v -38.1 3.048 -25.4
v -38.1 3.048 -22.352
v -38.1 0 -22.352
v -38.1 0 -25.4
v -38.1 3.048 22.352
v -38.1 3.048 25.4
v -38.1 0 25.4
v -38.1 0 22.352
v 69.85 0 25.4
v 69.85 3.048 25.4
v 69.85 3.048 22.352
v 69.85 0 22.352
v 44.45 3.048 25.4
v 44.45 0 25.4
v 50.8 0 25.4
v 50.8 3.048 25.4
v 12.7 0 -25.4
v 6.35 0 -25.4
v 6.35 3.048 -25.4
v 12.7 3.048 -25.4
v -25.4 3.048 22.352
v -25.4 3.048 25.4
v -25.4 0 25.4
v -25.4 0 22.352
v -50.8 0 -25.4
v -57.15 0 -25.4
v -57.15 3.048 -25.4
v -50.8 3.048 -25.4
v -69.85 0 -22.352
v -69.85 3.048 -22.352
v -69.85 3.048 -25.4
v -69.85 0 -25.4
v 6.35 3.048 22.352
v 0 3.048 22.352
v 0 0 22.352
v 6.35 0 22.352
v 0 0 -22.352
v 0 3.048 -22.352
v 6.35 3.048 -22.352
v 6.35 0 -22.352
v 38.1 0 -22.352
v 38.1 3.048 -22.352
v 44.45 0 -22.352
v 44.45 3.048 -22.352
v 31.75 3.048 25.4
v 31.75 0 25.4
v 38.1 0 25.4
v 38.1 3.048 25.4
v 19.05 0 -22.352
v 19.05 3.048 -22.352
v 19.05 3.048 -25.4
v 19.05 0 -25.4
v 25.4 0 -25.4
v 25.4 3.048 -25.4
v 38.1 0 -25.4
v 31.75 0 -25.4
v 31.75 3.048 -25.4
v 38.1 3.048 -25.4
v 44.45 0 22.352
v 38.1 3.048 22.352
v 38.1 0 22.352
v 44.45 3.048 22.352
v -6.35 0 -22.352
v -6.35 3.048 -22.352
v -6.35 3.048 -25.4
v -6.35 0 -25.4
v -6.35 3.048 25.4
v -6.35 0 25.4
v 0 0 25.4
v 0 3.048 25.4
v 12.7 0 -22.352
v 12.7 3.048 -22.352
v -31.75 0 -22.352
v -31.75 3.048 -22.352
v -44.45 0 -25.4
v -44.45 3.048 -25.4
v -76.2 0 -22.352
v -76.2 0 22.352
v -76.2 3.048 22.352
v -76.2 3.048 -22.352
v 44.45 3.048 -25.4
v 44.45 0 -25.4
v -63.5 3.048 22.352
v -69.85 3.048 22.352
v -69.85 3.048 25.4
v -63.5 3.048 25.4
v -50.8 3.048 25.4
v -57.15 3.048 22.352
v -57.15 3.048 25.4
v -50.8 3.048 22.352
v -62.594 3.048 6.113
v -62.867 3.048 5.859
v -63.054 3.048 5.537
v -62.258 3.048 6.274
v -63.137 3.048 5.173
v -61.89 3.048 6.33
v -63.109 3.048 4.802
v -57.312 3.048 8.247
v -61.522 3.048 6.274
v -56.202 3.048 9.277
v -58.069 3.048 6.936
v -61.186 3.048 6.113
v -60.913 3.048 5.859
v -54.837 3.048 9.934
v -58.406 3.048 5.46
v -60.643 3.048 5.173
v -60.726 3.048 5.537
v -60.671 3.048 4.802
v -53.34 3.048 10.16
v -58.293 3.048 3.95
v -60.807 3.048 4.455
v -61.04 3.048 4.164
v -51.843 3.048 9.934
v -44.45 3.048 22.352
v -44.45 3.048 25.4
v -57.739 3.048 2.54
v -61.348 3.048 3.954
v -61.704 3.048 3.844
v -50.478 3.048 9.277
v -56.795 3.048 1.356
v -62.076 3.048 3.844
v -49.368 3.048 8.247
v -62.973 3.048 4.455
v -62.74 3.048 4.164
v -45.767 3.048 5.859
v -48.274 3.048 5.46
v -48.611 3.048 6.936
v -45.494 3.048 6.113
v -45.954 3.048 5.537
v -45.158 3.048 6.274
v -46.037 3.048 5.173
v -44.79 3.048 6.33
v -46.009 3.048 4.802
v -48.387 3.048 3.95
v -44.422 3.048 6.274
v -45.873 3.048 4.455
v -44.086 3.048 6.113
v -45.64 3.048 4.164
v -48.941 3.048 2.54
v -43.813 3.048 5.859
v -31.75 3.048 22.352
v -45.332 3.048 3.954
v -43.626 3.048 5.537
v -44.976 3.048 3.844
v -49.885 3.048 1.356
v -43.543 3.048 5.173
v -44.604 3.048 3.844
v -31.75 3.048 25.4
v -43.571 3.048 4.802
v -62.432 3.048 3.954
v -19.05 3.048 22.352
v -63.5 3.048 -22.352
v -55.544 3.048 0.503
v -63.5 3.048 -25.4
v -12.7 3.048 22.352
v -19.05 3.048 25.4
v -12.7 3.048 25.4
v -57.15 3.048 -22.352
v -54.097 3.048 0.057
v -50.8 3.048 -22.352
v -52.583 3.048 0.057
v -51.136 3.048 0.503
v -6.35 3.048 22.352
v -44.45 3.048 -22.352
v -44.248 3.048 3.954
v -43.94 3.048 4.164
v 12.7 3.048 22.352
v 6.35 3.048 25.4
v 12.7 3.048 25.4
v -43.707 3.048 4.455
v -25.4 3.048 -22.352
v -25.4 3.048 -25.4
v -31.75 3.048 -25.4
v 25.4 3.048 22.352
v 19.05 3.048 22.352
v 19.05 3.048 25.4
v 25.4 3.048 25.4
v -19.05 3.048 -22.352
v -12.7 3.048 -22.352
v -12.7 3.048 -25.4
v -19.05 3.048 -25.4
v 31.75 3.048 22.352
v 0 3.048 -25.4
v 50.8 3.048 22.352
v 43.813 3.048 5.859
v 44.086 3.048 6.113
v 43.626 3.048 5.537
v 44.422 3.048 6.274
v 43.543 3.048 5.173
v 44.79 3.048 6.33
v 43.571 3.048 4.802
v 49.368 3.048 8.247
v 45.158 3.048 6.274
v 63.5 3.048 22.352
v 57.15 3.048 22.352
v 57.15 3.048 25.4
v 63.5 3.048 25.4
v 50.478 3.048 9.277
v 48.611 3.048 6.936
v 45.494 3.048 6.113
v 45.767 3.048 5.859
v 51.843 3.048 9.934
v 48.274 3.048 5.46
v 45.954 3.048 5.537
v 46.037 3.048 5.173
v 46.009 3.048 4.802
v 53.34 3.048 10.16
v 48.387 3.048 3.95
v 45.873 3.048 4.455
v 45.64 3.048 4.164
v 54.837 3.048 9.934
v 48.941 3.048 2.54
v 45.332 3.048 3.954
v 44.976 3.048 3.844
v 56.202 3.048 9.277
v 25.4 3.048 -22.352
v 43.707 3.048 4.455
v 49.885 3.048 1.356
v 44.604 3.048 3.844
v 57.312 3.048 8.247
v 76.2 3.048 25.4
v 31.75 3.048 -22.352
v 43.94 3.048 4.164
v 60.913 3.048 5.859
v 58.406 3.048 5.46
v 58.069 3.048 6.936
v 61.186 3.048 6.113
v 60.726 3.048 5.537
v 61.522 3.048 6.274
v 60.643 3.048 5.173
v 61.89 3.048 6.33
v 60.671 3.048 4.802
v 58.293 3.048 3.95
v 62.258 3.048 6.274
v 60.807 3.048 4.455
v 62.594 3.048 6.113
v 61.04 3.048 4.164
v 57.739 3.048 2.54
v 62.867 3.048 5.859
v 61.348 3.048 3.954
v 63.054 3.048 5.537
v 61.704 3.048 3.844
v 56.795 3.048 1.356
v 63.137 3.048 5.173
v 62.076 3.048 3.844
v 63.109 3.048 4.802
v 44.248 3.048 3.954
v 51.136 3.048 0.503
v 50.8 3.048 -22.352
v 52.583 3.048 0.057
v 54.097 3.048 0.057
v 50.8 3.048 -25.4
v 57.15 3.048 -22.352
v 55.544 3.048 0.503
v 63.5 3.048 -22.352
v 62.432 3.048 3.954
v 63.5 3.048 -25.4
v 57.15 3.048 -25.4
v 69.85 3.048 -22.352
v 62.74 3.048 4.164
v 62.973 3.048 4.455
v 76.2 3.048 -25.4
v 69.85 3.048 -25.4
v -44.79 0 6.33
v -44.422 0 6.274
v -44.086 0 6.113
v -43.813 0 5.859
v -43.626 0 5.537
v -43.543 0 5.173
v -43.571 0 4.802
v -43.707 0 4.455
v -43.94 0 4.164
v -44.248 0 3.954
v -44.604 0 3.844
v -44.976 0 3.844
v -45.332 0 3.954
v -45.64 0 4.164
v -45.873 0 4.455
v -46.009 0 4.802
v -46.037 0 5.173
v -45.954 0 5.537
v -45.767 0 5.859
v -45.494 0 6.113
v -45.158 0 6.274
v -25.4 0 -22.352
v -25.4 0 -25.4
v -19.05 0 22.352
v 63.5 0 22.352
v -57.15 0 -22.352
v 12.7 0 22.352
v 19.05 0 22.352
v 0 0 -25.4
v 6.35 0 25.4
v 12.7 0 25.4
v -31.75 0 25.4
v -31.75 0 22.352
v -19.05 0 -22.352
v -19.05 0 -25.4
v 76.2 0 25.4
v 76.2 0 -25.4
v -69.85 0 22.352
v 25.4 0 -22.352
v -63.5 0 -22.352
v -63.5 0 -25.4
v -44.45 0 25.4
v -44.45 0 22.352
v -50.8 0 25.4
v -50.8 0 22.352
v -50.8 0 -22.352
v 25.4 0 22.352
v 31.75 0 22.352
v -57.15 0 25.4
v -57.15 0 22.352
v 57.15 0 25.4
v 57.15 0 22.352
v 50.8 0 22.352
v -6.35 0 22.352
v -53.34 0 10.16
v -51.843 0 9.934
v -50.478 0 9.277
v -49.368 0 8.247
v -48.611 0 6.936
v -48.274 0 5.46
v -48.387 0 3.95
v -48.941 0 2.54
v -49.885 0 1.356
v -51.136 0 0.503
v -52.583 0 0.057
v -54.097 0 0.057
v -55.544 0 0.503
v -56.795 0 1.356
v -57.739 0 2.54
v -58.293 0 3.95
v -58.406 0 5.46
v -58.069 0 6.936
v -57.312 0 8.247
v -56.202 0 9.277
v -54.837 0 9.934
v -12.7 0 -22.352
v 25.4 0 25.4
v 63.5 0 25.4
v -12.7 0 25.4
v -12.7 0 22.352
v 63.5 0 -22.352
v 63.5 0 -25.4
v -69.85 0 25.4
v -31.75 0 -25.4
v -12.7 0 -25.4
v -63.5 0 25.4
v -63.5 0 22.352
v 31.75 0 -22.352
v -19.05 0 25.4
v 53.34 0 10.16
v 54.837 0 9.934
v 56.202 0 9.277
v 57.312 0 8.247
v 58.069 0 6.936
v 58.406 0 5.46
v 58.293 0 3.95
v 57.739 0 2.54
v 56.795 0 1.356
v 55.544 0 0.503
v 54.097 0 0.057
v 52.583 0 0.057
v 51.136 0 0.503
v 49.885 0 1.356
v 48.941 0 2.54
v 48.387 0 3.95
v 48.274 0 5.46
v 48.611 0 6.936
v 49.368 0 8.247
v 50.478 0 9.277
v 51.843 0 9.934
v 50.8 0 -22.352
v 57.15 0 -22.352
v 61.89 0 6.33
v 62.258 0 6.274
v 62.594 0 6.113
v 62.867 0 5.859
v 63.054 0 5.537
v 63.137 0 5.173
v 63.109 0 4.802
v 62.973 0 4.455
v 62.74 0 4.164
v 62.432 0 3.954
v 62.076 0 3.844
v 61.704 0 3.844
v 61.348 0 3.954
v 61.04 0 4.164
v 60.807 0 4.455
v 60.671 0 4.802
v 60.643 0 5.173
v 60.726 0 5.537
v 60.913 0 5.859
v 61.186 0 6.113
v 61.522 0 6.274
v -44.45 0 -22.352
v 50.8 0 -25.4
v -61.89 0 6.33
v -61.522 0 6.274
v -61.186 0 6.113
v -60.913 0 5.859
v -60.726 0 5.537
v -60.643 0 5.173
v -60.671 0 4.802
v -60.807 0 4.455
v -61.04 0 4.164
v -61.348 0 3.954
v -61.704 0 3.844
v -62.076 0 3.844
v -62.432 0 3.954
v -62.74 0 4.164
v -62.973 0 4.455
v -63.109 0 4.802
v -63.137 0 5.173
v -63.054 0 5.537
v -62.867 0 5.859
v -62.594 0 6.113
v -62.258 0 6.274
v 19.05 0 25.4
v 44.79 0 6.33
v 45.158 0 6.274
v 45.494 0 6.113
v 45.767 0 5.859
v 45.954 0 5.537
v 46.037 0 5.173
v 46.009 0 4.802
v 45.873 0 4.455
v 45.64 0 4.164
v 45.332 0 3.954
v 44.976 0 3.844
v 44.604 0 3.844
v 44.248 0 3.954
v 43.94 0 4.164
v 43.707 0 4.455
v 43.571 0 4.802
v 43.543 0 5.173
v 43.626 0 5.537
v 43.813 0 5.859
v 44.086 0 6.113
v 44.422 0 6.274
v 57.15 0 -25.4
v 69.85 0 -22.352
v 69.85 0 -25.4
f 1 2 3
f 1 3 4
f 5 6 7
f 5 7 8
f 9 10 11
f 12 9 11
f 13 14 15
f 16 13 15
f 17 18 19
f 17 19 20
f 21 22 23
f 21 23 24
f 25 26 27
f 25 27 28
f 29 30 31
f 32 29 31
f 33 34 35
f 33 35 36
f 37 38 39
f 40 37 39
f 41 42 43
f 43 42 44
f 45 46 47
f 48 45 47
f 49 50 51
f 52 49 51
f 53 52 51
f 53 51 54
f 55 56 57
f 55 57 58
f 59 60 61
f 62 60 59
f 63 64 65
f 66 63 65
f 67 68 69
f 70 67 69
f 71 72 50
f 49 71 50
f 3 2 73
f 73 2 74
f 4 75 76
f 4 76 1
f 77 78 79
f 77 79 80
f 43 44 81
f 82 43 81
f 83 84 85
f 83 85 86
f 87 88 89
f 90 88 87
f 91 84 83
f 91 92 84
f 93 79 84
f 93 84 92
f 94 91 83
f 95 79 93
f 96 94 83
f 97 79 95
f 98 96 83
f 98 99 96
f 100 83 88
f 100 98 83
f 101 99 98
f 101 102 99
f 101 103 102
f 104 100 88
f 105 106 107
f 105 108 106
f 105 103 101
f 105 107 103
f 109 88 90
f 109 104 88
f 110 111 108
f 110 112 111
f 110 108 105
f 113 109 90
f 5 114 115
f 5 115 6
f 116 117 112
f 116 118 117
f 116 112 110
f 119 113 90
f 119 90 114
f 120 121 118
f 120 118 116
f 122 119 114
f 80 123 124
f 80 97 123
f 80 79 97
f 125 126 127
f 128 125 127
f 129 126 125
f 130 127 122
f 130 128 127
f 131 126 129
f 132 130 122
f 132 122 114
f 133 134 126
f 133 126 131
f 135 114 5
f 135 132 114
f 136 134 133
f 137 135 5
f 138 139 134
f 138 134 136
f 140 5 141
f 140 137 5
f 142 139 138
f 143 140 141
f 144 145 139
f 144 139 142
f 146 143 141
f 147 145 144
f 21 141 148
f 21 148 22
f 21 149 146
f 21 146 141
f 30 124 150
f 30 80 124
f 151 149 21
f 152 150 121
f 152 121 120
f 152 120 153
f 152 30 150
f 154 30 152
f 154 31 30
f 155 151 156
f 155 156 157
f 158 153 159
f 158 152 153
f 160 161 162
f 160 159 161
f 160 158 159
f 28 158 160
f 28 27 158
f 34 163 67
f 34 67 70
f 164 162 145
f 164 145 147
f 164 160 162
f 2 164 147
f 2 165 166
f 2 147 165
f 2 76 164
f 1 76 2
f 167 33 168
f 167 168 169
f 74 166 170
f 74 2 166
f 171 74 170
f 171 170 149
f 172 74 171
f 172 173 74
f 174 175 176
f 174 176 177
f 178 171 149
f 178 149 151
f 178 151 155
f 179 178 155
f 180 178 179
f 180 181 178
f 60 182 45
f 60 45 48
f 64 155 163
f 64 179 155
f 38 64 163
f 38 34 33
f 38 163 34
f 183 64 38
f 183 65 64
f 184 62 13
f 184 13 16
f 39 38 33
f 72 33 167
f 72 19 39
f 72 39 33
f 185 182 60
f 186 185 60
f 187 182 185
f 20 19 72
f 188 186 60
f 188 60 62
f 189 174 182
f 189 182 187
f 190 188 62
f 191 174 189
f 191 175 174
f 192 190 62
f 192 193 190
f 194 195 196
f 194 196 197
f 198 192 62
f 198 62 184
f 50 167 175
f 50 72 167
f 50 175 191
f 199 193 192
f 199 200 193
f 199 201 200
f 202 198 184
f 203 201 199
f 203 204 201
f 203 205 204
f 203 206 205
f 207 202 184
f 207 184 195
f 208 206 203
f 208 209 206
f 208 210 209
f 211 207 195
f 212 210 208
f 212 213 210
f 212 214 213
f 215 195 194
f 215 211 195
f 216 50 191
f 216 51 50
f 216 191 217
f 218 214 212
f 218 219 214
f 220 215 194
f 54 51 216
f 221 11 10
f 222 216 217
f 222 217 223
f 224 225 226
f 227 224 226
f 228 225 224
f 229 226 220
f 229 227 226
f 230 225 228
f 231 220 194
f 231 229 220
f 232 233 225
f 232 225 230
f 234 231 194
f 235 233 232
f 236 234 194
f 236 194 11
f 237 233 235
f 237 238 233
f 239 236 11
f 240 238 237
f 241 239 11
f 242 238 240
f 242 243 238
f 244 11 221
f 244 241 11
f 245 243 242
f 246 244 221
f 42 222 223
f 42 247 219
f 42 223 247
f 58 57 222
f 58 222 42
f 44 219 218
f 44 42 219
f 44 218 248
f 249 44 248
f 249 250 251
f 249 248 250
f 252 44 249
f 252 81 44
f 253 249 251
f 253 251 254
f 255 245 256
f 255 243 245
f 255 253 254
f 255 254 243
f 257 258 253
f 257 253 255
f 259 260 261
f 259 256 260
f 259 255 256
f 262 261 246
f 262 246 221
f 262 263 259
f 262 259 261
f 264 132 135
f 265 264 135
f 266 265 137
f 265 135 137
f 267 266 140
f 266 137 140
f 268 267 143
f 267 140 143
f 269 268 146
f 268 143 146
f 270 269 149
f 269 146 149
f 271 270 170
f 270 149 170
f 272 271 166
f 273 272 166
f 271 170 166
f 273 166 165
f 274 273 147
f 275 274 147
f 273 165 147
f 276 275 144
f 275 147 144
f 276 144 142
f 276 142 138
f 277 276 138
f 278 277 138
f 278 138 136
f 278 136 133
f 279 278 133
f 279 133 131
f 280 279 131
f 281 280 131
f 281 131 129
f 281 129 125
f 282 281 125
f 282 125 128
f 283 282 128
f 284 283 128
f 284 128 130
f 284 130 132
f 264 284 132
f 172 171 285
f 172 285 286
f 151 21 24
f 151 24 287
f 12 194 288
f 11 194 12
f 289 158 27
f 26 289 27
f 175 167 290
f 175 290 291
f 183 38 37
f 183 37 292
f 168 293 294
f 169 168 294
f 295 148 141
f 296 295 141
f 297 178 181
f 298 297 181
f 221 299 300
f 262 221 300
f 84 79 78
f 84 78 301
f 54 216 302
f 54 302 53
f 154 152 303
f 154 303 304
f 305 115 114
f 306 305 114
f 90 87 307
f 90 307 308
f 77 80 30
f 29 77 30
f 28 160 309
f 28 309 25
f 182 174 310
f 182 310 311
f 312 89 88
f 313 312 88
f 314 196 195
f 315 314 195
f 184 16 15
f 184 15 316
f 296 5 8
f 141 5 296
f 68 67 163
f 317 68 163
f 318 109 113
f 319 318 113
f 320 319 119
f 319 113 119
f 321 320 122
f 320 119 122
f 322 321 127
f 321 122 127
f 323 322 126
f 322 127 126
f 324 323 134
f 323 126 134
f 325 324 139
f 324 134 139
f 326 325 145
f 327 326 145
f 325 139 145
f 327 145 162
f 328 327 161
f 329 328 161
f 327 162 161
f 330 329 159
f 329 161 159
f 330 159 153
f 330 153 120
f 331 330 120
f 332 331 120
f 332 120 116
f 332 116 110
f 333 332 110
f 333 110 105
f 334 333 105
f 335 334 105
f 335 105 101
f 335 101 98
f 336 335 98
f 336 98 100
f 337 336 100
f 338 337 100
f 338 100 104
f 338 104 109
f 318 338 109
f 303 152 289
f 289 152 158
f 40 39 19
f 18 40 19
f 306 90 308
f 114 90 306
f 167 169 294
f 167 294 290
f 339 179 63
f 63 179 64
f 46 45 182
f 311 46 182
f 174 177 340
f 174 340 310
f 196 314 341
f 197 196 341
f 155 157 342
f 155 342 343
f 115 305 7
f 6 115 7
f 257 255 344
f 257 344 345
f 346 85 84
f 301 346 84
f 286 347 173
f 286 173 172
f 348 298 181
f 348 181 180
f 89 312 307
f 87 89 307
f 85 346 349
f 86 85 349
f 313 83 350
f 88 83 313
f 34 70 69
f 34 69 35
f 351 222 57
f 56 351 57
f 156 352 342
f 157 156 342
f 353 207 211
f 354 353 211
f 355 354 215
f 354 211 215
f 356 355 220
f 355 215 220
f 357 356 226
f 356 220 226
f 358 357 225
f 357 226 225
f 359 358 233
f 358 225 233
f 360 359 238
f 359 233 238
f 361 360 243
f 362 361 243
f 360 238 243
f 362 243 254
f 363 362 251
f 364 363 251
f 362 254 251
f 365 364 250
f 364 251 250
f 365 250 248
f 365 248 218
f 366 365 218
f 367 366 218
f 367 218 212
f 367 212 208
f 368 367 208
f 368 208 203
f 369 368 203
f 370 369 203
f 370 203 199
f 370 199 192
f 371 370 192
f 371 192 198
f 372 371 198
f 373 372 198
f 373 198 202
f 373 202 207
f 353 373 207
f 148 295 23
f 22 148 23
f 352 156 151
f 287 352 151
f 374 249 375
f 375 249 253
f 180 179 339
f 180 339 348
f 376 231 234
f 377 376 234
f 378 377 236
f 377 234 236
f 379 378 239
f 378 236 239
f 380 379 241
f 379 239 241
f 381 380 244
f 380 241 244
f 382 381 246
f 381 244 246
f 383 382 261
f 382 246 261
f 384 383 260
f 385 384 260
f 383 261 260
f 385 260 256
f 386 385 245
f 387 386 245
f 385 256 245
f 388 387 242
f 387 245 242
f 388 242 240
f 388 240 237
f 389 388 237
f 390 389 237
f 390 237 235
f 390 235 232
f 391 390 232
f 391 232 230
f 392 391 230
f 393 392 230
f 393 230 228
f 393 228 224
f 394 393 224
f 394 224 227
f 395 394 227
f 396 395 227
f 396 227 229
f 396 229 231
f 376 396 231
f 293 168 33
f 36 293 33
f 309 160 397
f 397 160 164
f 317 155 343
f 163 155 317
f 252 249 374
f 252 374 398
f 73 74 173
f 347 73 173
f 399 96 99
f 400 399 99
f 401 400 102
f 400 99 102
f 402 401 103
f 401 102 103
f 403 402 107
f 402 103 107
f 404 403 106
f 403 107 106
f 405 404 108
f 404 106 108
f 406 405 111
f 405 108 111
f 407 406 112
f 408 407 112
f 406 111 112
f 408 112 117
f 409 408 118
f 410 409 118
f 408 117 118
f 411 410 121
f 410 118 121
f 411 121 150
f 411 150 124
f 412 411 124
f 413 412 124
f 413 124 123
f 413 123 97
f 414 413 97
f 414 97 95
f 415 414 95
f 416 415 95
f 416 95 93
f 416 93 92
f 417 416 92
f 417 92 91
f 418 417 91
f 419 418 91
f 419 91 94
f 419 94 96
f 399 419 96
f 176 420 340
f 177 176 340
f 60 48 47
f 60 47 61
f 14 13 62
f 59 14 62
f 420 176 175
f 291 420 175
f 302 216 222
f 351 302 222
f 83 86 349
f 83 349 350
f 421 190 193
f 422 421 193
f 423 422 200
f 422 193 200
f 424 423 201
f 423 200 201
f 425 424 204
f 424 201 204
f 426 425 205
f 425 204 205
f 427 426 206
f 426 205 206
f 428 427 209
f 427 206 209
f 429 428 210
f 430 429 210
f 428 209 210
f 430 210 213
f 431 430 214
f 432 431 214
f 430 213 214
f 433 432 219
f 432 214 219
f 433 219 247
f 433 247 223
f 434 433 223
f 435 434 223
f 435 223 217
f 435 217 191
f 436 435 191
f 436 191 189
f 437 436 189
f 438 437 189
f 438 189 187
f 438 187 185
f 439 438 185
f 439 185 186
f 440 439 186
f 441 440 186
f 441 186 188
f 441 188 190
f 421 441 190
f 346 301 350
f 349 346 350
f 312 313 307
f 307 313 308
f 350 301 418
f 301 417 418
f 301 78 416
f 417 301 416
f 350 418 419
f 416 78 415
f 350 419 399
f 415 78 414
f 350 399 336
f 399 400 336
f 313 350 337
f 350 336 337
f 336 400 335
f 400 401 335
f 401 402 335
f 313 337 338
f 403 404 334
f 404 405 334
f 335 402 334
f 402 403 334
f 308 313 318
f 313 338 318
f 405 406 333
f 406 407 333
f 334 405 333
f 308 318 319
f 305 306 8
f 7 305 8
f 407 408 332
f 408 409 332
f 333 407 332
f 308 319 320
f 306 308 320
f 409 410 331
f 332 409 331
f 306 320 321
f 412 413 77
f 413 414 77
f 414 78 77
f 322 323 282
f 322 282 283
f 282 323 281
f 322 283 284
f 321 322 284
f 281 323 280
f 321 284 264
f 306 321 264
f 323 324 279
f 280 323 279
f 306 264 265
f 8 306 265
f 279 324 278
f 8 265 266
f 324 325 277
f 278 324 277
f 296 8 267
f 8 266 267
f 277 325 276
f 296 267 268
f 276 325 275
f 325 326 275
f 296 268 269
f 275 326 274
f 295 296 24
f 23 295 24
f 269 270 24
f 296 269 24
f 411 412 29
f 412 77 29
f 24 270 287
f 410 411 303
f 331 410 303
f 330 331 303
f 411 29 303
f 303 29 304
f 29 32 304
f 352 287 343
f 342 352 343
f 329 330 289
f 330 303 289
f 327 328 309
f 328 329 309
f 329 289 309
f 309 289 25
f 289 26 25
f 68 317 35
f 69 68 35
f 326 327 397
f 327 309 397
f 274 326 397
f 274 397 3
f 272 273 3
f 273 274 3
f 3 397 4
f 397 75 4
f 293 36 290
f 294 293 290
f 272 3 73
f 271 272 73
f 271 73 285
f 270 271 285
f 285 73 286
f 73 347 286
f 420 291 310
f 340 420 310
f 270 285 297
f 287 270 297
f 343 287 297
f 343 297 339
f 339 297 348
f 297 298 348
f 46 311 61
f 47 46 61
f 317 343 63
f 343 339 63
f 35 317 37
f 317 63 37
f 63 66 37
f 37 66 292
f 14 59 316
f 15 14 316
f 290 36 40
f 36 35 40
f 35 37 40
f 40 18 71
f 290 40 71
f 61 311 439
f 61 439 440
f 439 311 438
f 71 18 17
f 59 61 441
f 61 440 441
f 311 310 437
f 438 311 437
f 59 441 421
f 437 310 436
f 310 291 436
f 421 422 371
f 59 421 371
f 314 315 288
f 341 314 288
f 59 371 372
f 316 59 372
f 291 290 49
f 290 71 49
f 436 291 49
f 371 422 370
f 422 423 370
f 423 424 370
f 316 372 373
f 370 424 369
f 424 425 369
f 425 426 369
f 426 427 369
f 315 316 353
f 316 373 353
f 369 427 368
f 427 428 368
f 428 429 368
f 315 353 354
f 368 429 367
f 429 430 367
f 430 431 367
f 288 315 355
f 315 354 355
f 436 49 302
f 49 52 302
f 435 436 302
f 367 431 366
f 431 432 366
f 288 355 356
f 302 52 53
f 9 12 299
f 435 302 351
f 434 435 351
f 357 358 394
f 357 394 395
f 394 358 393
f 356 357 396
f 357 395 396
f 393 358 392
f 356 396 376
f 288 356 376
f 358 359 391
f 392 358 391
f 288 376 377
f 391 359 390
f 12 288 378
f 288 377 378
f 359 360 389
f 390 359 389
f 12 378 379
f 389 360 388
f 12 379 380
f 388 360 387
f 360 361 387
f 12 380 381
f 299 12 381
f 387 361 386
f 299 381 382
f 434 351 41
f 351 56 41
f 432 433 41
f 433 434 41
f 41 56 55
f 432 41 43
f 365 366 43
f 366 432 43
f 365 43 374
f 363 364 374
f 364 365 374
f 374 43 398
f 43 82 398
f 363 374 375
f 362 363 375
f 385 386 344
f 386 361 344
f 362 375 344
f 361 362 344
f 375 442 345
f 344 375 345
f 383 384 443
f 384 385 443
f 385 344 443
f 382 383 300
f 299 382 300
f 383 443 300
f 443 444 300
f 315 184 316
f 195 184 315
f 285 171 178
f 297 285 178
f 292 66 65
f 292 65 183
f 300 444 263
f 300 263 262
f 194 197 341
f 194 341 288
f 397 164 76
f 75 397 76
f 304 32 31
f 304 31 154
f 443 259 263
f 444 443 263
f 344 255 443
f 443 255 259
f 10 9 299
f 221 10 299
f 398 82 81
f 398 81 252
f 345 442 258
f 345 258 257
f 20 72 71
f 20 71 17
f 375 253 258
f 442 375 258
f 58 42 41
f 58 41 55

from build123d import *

# Parameters (mm, degrees)
SKETCH1_W           = 152.4
SKETCH1_H           = 50.8
BOSS_EXTRUDE1_DEPTH = 3.048
SKETCH2_W           = 6.35
SKETCH2_H           = 3.048
CUT_EXTRUDE1_DEPTH  = 81.379663498
SKETCH4_R           = 1.25
SKETCH4_R_2         = 5.08
CUT_EXTRUDE2_DEPTH  = 81.379663498


with BuildPart() as part:
    # Sketch1 → Boss-Extrude1 (new body)
    with BuildSketch(Plane(origin=(0, 0, 0), x_dir=(1, 0, 0), z_dir=(0, 1, 0))):
        Rectangle(SKETCH1_W, SKETCH1_H)
    extrude(amount=BOSS_EXTRUDE1_DEPTH)

    # Sketch2 → Cut-Extrude1 (cut, through all)
    with BuildSketch(Plane(origin=(0, 3.048, 0), x_dir=(1, 0, 0), z_dir=(0, 1, 0))):
        with Locations((-73.025, 23.876)):
            Rectangle(SKETCH2_W, SKETCH2_H)
        with Locations((-60.325, 23.876)):
            Rectangle(SKETCH2_W, SKETCH2_H)
        with Locations((-47.625, 23.876)):
            Rectangle(SKETCH2_W, SKETCH2_H)
        with Locations((-34.925, 23.876)):
            Rectangle(SKETCH2_W, SKETCH2_H)
        with Locations((-22.225, 23.876)):
            Rectangle(SKETCH2_W, SKETCH2_H)
        with Locations((-9.525, 23.876)):
            Rectangle(SKETCH2_W, SKETCH2_H)
        with Locations((15.875, 23.876)):
            Rectangle(SKETCH2_W, SKETCH2_H)
        with Locations((3.175, 23.876)):
            Rectangle(SKETCH2_W, SKETCH2_H)
        with Locations((28.575, 23.876)):
            Rectangle(SKETCH2_W, SKETCH2_H)
        with Locations((41.275, 23.876)):
            Rectangle(SKETCH2_W, SKETCH2_H)
        with Locations((53.975, 23.876)):
            Rectangle(SKETCH2_W, SKETCH2_H)
        with Locations((66.675, 23.876)):
            Rectangle(SKETCH2_W, SKETCH2_H)
        with Locations((-73.025, -23.876)):
            Rectangle(SKETCH2_W, SKETCH2_H)
        with Locations((-60.325, -23.876)):
            Rectangle(SKETCH2_W, SKETCH2_H)
        with Locations((-47.625, -23.876)):
            Rectangle(SKETCH2_W, SKETCH2_H)
        with Locations((-34.925, -23.876)):
            Rectangle(SKETCH2_W, SKETCH2_H)
        with Locations((-22.225, -23.876)):
            Rectangle(SKETCH2_W, SKETCH2_H)
        with Locations((-9.525, -23.876)):
            Rectangle(SKETCH2_W, SKETCH2_H)
        with Locations((3.175, -23.876)):
            Rectangle(SKETCH2_W, SKETCH2_H)
        with Locations((15.875, -23.876)):
            Rectangle(SKETCH2_W, SKETCH2_H)
        with Locations((28.575, -23.876)):
            Rectangle(SKETCH2_W, SKETCH2_H)
        with Locations((41.275, -23.876)):
            Rectangle(SKETCH2_W, SKETCH2_H)
        with Locations((53.975, -23.876)):
            Rectangle(SKETCH2_W, SKETCH2_H)
        with Locations((66.675, -23.876)):
            Rectangle(SKETCH2_W, SKETCH2_H)
    extrude(amount=-CUT_EXTRUDE1_DEPTH, mode=Mode.SUBTRACT)

    # Sketch4 → Cut-Extrude2 (cut, through all)
    with BuildSketch(Plane(origin=(0, 3.048, 0), x_dir=(1, 0, 0), z_dir=(0, 1, 0))):
        with Locations(Location((-61.89, -5.08, 0), (0, 0, 270))):
            Circle(SKETCH4_R)
        with Locations(Location((-44.79, -5.08, 0), (0, 0, 270))):
            Circle(SKETCH4_R)
        with Locations(Location((-53.34, -5.08, 0), (0, 0, 270))):
            Circle(SKETCH4_R_2)
        with Locations(Location((44.79, -5.08, 0), (0, 0, 270))):
            Circle(SKETCH4_R)
        with Locations(Location((53.34, -5.08, 0), (0, 0, 270))):
            Circle(SKETCH4_R_2)
        with Locations(Location((61.89, -5.08, 0), (0, 0, 270))):
            Circle(SKETCH4_R)
    extrude(amount=-CUT_EXTRUDE2_DEPTH, mode=Mode.SUBTRACT)


solid = part.part
